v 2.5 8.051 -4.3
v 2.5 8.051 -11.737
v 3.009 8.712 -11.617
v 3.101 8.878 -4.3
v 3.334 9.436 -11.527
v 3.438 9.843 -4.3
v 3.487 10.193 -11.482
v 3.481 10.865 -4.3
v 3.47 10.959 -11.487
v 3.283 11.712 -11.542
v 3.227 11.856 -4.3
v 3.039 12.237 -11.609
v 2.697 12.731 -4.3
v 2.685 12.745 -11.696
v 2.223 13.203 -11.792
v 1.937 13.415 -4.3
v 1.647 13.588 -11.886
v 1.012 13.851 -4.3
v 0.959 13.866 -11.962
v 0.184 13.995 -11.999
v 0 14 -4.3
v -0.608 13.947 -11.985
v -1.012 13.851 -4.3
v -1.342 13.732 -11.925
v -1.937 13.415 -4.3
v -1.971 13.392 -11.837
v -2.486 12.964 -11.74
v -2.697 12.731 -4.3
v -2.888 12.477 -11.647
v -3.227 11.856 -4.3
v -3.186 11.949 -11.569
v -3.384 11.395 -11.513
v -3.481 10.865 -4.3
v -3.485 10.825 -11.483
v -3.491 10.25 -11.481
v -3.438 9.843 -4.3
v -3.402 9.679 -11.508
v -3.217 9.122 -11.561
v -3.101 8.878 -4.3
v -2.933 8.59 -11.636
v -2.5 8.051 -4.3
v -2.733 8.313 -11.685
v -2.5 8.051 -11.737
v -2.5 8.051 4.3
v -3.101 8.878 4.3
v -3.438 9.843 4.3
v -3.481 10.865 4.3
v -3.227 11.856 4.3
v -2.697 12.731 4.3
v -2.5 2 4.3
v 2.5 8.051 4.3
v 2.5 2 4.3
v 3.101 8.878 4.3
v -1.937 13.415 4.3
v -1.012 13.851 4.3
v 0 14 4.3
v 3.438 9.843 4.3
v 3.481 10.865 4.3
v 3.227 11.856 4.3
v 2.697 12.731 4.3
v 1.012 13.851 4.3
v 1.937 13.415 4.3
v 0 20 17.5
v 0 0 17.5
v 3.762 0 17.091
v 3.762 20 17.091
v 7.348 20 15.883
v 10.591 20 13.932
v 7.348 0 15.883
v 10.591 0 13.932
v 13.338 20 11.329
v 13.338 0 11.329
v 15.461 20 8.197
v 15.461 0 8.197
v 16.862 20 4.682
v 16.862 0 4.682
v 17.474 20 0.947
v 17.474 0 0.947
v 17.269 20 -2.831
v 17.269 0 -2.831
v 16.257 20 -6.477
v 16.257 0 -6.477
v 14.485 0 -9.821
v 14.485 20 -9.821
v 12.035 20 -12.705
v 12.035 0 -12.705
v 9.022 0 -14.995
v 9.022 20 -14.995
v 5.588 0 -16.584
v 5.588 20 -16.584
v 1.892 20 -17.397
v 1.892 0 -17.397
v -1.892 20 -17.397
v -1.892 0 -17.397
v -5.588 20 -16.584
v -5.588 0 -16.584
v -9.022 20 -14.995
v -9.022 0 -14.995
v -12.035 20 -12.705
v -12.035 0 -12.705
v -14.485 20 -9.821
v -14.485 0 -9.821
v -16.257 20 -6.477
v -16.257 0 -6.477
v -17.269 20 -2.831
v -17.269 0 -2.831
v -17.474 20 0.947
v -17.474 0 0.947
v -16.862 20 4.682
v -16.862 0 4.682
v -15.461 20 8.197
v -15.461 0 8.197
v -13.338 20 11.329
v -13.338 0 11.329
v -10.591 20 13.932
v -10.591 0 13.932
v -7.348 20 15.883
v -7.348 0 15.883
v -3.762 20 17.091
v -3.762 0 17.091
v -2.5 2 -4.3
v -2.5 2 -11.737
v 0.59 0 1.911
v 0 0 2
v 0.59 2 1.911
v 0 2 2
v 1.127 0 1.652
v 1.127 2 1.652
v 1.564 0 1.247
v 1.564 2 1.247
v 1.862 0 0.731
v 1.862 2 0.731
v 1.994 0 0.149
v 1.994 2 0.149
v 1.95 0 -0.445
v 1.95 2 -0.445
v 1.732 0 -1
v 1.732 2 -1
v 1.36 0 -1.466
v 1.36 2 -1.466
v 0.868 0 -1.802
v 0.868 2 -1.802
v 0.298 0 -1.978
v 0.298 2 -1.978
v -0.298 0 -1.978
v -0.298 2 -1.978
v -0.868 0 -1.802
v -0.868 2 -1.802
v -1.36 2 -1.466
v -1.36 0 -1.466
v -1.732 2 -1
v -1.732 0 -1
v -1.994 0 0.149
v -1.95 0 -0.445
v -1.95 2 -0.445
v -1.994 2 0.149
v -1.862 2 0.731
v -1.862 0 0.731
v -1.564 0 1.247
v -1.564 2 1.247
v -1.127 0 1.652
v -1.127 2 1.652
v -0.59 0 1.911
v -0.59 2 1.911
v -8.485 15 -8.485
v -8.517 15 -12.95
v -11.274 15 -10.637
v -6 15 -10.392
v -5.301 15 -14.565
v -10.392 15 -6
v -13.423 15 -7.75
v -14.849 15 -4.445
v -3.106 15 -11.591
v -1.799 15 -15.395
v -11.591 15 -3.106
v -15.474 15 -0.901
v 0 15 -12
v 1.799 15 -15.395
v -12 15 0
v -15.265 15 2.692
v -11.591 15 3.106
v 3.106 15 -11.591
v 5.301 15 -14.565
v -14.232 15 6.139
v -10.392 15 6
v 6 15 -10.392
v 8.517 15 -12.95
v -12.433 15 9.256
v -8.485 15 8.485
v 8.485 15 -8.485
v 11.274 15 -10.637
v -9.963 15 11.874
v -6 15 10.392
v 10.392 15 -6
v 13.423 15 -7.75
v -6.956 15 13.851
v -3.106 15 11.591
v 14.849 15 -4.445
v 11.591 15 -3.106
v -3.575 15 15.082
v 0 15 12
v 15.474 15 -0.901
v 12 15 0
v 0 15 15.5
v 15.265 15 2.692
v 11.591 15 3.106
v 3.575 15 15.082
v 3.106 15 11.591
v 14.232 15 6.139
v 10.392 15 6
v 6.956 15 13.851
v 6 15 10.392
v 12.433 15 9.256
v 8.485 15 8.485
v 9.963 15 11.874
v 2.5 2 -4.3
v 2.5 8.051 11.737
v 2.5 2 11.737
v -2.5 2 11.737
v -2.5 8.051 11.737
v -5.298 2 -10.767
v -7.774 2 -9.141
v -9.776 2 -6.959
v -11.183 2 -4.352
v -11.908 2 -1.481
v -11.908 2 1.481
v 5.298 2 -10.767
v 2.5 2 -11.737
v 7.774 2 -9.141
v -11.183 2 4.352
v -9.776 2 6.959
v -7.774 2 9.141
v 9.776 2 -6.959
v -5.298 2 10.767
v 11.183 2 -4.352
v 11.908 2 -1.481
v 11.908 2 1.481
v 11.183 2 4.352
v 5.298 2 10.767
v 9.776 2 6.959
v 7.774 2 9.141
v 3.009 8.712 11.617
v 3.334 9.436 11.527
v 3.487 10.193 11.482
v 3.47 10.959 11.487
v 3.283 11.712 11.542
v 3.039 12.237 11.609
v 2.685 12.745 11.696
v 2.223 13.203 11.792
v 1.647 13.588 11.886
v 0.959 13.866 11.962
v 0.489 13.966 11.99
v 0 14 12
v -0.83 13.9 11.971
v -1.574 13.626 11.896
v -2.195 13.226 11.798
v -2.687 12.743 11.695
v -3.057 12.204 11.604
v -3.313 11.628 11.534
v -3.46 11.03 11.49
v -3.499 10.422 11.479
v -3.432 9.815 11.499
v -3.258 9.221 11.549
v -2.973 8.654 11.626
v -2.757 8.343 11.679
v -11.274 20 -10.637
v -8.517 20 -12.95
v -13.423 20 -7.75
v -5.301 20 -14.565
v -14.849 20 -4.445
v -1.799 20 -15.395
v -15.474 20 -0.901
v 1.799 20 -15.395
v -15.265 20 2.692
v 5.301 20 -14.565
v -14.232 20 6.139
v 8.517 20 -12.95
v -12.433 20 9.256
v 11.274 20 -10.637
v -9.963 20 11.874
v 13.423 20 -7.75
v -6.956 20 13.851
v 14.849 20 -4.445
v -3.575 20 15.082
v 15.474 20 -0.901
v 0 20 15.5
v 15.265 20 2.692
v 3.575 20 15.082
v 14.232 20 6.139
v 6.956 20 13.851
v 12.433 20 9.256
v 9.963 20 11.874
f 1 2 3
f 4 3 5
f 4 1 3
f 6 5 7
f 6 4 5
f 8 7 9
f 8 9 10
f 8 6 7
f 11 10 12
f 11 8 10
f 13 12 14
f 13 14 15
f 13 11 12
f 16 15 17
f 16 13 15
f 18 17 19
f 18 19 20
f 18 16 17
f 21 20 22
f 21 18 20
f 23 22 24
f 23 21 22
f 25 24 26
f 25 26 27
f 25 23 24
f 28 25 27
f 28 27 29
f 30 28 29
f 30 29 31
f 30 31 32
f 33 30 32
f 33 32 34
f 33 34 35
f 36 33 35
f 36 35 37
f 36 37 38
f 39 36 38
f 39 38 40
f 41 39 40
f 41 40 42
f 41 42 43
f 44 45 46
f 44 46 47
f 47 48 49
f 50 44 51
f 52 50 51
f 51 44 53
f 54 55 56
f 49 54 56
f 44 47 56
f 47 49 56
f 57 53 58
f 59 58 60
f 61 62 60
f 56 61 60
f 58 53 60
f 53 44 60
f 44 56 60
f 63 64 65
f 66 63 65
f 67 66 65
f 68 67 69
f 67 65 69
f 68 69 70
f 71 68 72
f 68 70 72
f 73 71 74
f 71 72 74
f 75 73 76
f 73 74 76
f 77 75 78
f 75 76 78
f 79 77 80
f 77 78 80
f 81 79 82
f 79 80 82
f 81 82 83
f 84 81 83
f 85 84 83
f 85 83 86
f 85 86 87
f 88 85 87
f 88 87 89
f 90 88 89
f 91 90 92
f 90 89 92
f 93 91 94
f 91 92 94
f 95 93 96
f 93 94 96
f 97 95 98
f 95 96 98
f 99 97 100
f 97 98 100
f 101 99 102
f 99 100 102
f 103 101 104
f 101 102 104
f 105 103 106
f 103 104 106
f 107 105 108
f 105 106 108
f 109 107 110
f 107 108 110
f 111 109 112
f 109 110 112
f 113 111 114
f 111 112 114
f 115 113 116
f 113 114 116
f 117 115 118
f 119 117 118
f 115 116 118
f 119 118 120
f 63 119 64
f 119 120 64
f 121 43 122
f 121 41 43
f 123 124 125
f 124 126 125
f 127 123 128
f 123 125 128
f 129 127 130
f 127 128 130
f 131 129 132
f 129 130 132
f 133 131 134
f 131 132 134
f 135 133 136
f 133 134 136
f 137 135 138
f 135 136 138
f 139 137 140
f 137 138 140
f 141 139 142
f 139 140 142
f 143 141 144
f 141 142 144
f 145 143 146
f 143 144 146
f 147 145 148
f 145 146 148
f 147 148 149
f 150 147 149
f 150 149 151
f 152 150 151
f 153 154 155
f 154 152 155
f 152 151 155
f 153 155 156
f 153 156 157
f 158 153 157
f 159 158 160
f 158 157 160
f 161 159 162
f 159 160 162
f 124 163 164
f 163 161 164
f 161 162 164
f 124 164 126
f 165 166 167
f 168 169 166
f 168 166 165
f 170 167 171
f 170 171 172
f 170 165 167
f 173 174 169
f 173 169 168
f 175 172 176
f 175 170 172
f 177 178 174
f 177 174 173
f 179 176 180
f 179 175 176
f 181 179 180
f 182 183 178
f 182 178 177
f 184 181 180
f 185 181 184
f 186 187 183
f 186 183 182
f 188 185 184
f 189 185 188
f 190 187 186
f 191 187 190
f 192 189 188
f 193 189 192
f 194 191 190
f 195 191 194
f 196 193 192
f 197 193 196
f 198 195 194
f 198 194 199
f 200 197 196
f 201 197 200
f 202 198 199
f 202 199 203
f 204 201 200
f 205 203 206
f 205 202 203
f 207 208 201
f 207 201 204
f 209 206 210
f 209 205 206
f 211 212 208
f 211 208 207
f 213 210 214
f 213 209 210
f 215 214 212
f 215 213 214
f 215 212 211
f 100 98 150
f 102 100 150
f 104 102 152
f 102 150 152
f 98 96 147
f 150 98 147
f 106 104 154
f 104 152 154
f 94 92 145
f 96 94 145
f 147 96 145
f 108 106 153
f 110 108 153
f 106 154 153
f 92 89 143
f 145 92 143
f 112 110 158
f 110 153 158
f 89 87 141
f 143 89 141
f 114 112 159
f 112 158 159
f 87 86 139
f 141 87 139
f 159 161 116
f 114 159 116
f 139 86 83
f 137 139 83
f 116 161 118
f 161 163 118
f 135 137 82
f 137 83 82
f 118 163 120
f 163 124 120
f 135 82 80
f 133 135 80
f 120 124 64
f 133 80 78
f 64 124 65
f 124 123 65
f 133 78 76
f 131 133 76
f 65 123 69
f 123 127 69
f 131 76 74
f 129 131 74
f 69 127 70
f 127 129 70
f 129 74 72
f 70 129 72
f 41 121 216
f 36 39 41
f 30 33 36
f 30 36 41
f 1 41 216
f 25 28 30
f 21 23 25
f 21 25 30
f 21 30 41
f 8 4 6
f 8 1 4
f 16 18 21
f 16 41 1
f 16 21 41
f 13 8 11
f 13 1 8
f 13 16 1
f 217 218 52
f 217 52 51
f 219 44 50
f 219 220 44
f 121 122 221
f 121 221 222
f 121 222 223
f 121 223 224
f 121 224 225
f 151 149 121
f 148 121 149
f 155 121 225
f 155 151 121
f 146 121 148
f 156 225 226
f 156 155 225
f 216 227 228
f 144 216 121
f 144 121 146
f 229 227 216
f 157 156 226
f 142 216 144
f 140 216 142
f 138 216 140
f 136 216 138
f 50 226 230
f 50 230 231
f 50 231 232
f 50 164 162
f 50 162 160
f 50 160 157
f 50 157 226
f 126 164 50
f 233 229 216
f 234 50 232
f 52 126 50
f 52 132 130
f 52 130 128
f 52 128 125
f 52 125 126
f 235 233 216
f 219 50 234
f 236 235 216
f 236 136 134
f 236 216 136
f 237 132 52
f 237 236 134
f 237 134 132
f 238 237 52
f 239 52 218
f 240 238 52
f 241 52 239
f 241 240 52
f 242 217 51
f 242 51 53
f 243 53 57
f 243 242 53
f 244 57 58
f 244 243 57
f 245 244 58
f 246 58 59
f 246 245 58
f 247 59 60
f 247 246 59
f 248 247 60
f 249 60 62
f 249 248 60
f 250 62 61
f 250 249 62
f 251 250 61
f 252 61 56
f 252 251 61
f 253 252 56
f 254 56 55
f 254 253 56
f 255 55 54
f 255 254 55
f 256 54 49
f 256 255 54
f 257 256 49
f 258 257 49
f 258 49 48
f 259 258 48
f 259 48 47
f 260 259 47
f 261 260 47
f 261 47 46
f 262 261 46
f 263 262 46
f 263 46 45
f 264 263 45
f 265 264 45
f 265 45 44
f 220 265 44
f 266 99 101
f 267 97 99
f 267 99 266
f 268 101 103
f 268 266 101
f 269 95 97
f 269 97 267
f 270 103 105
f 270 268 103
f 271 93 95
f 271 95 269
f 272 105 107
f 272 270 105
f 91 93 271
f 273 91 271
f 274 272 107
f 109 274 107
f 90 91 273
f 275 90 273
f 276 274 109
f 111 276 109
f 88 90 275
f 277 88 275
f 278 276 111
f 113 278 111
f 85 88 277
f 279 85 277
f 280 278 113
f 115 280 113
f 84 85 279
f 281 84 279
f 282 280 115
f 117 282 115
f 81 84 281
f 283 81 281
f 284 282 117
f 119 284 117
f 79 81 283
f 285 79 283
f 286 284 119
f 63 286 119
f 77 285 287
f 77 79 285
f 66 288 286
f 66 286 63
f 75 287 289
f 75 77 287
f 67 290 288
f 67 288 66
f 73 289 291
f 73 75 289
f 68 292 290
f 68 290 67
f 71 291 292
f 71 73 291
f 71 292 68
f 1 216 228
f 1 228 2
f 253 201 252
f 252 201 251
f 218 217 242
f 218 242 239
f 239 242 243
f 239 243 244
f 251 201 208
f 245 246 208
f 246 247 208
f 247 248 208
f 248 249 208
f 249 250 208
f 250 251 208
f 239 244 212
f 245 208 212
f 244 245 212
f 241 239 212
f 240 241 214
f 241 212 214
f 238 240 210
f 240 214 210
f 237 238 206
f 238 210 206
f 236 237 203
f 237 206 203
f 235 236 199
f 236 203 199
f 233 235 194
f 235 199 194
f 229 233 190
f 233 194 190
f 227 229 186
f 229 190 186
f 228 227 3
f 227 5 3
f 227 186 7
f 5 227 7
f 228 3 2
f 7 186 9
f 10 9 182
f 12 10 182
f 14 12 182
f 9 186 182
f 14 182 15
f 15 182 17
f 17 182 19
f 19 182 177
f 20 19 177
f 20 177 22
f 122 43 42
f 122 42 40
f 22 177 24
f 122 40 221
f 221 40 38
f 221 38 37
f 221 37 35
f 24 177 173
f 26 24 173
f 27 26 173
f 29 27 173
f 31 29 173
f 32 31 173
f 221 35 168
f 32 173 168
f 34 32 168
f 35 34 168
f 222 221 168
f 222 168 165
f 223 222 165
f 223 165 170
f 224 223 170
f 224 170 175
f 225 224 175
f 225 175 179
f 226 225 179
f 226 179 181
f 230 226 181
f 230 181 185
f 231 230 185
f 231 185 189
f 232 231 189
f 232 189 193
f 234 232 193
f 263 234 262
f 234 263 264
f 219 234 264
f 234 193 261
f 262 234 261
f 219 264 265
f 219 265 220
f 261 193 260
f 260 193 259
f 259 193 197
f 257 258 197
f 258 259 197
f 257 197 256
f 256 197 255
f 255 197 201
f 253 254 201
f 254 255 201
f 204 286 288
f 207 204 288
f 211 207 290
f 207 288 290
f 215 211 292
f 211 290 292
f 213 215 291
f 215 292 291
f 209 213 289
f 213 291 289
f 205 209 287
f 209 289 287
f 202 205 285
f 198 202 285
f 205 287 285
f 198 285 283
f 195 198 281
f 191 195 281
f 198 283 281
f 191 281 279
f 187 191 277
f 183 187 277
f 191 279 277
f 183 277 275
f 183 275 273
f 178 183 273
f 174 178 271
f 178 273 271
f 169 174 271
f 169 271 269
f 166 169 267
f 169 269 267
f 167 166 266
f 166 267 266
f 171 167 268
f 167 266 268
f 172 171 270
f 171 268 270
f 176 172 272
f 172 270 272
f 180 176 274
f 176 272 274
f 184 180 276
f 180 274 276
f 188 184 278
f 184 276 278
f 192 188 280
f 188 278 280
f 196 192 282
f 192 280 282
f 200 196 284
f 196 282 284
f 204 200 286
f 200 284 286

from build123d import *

# Parameters (mm, degrees)
SKETCH1_R                            = 17.5
BOSS_EXTRUDE1_DEPTH                  = 20
SKETCH2_R                            = 12
CUT_EXTRUDE1_DEPTH                   = 18
SKETCH2_3_R                          = 15.5
SKETCH2_3_R_2                        = 12
CUT_EXTRUDE2_DEPTH                   = 5
BOSS_EXTRUDE2_REACH                  = 33.82
BOSS_EXTRUDE2_END_RADIUS             = 12
BOSS_EXTRUDE2_DIRECTION_2_REACH      = 33.82
BOSS_EXTRUDE2_DIRECTION_2_END_RADIUS = 12
SKETCH5_W                            = 7
SKETCH5_H                            = 8.6
CUT_EXTRUDE3_DEPTH                   = 18
F_4_0MM_DOWEL_HOLE1_D                = 4
F_4_0MM_DOWEL_HOLE1_ON_FACE_2_D      = 4


with BuildPart() as part:
    # Sketch1 → Boss-Extrude1 (new body)
    with BuildSketch(Plane(origin=(0, 0, 0), x_dir=(1, 0, 0), z_dir=(0, 1, 0))):
        with Locations(Location((0, 0, 0), (0, 0, 270))):
            Circle(SKETCH1_R)
    extrude(amount=BOSS_EXTRUDE1_DEPTH)

    # Sketch2 → Cut-Extrude1 (cut)
    with BuildSketch(Plane(origin=(0, 20, 0), x_dir=(1, 0, 0), z_dir=(0, 1, 0))):
        with Locations(Location((0, 0, 0), (0, 0, 270))):
            Circle(SKETCH2_R)
    extrude(amount=-CUT_EXTRUDE1_DEPTH, mode=Mode.SUBTRACT)

    # Sketch2<3> → Cut-Extrude2 (cut)
    with BuildSketch(Plane(origin=(0, 20, 0), x_dir=(1, 0, 0), z_dir=(0, 1, 0))):
        with Locations(Location((0, 0, 0), (0, 0, 270))):
            Circle(SKETCH2_3_R)
        with Locations(Location((0, 0, 0), (0, 0, 270))):
            Circle(SKETCH2_3_R_2, mode=Mode.SUBTRACT)
    extrude(amount=-CUT_EXTRUDE2_DEPTH, mode=Mode.SUBTRACT)

    # Boss-Extrude2: up to this cylinder (the profile starts inside it)
    boss_extrude2_end = Plane(origin=(0, 8.116384, 0), z_dir=(0, 1, 0)) * Cylinder(BOSS_EXTRUDE2_END_RADIUS, 92.64, mode=Mode.PRIVATE)
    # Sketch3 → Boss-Extrude2 (add, up to the surface)
    with BuildSketch(Plane.XY, mode=Mode.PRIVATE) as boss_extrude2_sk1:
        with BuildLine():
            Line((-2.5, 8.050510257), (-2.5, 2))
            Line((-2.5, 2), (2.5, 2))
            Line((2.5, 2), (2.5, 8.050510257))
            ThreePointArc((2.5, 8.050510257), (0, 14), (-2.5, 8.050510257))
        make_face()
    boss_extrude2_tool1 = extrude(boss_extrude2_sk1.sketch, amount=BOSS_EXTRUDE2_REACH, mode=Mode.PRIVATE) & boss_extrude2_end
    add(boss_extrude2_tool1.solids().sort_by_distance((0, 8.116384, 0))[0])

    # Boss-Extrude2 direction 2: up to this cylinder (the profile starts inside it)
    boss_extrude2_direction_2_end = Plane(origin=(0, 8.116384, 0), z_dir=(0, 1, 0)) * Cylinder(BOSS_EXTRUDE2_DIRECTION_2_END_RADIUS, 92.64, mode=Mode.PRIVATE)
    # Sketch3 → Boss-Extrude2 direction 2 (add, up to the surface)
    with BuildSketch(Plane.XY, mode=Mode.PRIVATE) as boss_extrude2_direction_2_sk1:
        with BuildLine():
            Line((-2.5, 8.050510257), (-2.5, 2))
            Line((-2.5, 2), (2.5, 2))
            Line((2.5, 2), (2.5, 8.050510257))
            ThreePointArc((2.5, 8.050510257), (0, 14), (-2.5, 8.050510257))
        make_face()
    boss_extrude2_direction_2_tool1 = extrude(boss_extrude2_direction_2_sk1.sketch, amount=-BOSS_EXTRUDE2_DIRECTION_2_REACH, mode=Mode.PRIVATE) & boss_extrude2_direction_2_end
    add(boss_extrude2_direction_2_tool1.solids().sort_by_distance((0, 8.116384, 0))[0])

    # Sketch5 → Cut-Extrude3 (cut)
    with BuildSketch(Plane(origin=(0, 20, 0), x_dir=(1, 0, 0), z_dir=(0, 1, 0))):
        Rectangle(SKETCH5_W, SKETCH5_H)
    extrude(amount=-CUT_EXTRUDE3_DEPTH, mode=Mode.SUBTRACT)

    # Ø4.0mm Dowel Hole1 (through all)
    with Locations(Plane(origin=(0, 0, 0), x_dir=(0, 0, -1), z_dir=(0, -1, 0))):
        with Locations((0, 0)):
            Hole(F_4_0MM_DOWEL_HOLE1_D / 2)

    # Ø4.0mm Dowel Hole1 on face 2 (through all)
    with Locations(Plane.ZX.offset(2)):
        with Locations((0, 0)):
            Hole(F_4_0MM_DOWEL_HOLE1_ON_FACE_2_D / 2)


solid = part.part
